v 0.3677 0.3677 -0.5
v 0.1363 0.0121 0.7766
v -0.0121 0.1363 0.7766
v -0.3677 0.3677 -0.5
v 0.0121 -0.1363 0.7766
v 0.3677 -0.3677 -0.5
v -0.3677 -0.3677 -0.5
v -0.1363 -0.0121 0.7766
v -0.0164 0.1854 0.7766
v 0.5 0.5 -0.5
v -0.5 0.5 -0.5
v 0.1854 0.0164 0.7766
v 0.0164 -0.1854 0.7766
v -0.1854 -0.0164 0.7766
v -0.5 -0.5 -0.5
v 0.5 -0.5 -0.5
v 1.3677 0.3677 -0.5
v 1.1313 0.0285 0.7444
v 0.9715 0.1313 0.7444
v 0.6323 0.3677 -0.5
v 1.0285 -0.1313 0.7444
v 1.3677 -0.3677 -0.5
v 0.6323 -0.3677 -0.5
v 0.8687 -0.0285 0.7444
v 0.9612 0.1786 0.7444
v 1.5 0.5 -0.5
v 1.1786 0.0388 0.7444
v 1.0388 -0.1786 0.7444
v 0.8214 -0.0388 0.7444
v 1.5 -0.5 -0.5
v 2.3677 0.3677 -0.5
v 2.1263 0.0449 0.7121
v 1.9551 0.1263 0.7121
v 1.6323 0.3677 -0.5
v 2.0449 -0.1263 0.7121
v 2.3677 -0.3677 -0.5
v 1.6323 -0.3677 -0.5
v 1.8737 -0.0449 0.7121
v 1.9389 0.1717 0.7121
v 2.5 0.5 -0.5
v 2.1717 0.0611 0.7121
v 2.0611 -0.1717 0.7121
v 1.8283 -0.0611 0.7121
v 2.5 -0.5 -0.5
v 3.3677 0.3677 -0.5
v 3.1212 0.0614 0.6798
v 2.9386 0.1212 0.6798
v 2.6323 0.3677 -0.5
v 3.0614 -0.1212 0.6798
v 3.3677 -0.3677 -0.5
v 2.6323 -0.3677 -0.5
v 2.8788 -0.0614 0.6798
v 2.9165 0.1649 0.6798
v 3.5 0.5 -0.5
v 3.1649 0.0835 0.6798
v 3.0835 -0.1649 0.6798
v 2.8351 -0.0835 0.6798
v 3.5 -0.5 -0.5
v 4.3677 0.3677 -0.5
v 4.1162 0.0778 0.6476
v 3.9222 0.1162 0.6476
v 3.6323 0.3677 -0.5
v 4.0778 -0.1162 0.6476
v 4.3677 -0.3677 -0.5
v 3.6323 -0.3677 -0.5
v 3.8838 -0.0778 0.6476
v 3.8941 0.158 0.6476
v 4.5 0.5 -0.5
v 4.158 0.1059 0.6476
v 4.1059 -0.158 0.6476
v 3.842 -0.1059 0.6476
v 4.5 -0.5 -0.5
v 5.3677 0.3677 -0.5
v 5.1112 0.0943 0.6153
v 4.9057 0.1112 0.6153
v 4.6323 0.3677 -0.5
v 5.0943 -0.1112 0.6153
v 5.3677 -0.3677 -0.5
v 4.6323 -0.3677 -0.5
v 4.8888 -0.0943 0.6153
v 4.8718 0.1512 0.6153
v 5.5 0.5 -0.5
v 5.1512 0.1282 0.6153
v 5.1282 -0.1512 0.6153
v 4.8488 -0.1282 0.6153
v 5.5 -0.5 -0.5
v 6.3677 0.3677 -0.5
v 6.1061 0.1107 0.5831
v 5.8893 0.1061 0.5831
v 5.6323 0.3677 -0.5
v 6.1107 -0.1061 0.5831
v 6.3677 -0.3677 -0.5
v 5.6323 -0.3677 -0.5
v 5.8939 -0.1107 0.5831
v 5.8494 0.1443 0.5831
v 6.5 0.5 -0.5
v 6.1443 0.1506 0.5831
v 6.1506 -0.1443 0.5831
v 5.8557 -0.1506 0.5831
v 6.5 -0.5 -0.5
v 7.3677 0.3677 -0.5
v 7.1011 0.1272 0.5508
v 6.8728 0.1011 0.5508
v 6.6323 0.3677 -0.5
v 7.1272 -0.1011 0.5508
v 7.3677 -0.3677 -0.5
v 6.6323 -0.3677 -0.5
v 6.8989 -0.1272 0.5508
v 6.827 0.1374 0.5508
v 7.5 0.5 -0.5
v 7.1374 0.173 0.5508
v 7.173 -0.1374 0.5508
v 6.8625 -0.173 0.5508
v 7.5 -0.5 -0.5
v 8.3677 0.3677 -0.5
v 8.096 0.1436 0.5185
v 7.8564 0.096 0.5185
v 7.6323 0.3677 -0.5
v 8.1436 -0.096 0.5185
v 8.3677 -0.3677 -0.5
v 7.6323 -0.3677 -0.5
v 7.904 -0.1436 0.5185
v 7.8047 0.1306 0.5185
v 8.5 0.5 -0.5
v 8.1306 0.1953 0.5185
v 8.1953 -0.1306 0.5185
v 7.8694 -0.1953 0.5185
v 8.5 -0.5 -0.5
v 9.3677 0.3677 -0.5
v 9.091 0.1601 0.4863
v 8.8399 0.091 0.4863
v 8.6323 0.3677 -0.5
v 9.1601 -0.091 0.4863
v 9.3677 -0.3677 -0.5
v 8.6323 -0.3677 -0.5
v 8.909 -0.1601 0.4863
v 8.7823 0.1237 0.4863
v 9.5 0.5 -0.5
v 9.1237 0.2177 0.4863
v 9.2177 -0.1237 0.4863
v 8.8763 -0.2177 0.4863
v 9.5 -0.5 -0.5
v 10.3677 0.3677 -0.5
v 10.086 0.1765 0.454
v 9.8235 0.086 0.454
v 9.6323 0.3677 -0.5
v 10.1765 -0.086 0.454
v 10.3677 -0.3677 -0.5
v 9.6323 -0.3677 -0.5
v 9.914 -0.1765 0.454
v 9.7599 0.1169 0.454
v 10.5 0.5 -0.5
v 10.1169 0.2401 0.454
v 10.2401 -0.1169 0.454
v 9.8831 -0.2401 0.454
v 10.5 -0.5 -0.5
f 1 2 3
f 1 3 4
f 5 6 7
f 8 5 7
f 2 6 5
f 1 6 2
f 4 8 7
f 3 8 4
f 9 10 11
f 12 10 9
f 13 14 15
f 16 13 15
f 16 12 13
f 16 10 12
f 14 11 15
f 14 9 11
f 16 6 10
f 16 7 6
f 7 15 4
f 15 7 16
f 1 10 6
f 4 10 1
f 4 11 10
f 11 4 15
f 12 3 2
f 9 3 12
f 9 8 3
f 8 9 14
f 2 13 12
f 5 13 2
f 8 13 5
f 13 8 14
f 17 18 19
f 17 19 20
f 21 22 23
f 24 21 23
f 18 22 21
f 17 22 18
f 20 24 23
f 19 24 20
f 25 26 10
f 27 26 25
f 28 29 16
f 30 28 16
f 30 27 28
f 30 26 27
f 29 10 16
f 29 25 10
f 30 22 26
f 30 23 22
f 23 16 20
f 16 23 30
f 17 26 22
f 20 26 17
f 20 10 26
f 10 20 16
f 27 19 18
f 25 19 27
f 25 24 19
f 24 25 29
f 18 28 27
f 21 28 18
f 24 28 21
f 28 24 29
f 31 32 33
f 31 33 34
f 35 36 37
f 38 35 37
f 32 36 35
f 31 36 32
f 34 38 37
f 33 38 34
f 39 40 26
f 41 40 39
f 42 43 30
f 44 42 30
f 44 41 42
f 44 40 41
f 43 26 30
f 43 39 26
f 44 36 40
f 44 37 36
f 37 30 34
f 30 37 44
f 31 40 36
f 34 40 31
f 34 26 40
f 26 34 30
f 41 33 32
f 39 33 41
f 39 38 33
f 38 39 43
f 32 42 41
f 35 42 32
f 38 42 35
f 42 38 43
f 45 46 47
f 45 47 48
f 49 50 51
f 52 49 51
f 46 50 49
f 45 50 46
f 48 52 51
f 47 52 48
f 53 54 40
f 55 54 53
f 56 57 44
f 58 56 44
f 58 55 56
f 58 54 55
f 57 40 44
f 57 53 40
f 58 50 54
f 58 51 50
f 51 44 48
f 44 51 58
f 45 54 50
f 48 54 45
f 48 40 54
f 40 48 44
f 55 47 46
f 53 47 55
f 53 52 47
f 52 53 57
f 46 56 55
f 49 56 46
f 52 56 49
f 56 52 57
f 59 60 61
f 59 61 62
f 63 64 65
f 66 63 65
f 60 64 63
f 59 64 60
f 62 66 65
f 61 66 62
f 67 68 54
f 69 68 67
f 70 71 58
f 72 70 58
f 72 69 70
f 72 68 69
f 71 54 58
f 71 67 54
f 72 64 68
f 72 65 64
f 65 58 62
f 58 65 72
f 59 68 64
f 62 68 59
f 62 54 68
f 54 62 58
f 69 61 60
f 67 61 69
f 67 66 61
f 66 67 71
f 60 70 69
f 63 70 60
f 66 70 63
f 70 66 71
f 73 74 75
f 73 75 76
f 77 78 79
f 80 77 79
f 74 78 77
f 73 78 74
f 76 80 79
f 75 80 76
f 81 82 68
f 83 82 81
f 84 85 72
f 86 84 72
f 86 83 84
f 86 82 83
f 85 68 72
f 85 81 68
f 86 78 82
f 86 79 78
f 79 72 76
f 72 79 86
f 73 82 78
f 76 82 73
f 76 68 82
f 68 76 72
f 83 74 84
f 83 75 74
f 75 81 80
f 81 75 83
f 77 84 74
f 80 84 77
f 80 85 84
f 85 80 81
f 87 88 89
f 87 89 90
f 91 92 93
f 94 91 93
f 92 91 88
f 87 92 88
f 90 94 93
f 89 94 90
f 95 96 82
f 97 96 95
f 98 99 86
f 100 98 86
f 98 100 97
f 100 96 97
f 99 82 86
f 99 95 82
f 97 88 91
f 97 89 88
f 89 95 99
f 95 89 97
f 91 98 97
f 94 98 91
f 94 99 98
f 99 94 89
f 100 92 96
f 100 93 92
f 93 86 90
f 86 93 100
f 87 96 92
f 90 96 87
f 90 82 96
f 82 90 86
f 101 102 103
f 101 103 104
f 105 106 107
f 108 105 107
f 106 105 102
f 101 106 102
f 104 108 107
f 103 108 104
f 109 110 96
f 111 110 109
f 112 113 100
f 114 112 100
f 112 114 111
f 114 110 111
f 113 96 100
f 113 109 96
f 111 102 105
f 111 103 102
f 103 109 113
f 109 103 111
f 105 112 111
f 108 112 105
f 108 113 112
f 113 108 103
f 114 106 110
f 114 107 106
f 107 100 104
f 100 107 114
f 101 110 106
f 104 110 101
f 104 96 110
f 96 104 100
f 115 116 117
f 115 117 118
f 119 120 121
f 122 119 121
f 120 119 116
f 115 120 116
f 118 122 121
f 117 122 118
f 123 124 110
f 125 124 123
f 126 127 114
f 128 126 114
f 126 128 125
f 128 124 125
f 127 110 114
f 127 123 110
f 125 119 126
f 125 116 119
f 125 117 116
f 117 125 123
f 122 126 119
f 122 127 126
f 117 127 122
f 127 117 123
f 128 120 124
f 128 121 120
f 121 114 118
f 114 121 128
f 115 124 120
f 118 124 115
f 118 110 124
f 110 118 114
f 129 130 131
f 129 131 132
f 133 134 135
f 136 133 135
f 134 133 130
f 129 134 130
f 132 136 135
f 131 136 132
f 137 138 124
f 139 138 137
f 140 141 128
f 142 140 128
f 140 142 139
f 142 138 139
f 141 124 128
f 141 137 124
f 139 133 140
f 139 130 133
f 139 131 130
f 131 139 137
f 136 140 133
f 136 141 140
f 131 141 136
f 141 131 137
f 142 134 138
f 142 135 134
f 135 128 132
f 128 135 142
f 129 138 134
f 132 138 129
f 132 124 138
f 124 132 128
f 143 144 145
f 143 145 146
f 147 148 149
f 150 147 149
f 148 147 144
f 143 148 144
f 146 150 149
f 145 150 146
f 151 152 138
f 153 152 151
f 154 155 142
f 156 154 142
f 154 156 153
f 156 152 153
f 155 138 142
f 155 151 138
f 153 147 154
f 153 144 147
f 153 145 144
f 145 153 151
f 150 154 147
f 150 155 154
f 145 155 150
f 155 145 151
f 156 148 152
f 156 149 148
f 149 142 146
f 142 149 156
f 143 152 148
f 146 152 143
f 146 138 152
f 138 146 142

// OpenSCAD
/* [Global] */

pvalue = 20; // [10.0:20.0]
pvalue_text = "blah blah blah";

/* [Hidden] */

points_01 = [[-0.048376, -0.463729, 0.131425], [0.463729, -0.048376, 0.131425], [-0.463729, 0.048376, 0.131425], [0.048376, 0.463729, 0.131425], [-0.5, 0.5, -0.5], [0.5, 0.5, -0.5], [-0.5, -0.5, -0.5], [0.5, -0.5, -0.5], [-0.341008, 0.035574, 0.131425], [0.035574, 0.341008, 0.131425], [0.36768, 0.36768, -0.5], [-0.36768, 0.36768, -0.5], [-0.36768, -0.36768, -0.5], [0.36768, -0.36768, -0.5], [0.341008, -0.035574, 0.131425], [-0.035574, -0.341008, 0.131425]];
triangles_01 = [[8, 9, 11], [11, 9, 10], [12, 13, 15], [15, 13, 14], [13, 10, 14], [14, 10, 9], [15, 8, 12], [12, 8, 11], [2, 4, 3], [3, 4, 5], [6, 0, 7], [7, 0, 1], [3, 5, 1], [1, 5, 7], [4, 2, 6], [6, 2, 0], [2, 3, 8], [8, 3, 9], [5, 4, 10], [10, 4, 11], [6, 7, 12], [12, 7, 13], [1, 0, 14], [14, 0, 15], [7, 5, 13], [13, 5, 10], [3, 1, 9], [9, 1, 14], [0, 2, 15], [15, 2, 8], [4, 6, 11], [11, 6, 12]];

points_02 = [[-0.185412, -0.01639, 0.776613], [0.01639, -0.185412, 0.776613], [-0.01639, 0.185412, 0.776613], [0.185412, 0.01639, 0.776613], [-0.5, 0.5, -0.5], [0.5, 0.5, -0.5], [-0.5, -0.5, -0.5], [0.5, -0.5, -0.5], [-0.012052, 0.136344, 0.776613], [0.136344, 0.012052, 0.776613], [0.36768, 0.36768, -0.5], [-0.36768, 0.36768, -0.5], [-0.36768, -0.36768, -0.5], [0.36768, -0.36768, -0.5], [0.012052, -0.136344, 0.776613], [-0.136344, -0.012052, 0.776613]];
triangles_02 = [[9, 10, 8], [8, 10, 11], [13, 14, 12], [12, 14, 15], [14, 13, 9], [9, 13, 10], [12, 15, 11], [11, 15, 8], [4, 5, 2], [2, 5, 3], [0, 1, 6], [6, 1, 7], [1, 3, 7], [7, 3, 5], [6, 4, 0], [0, 4, 2], [2, 3, 8], [8, 3, 9], [5, 4, 10], [10, 4, 11], [6, 7, 12], [12, 7, 13], [1, 0, 14], [14, 0, 15], [7, 5, 13], [13, 5, 10], [3, 1, 9], [9, 1, 14], [0, 2, 15], [15, 2, 8], [4, 6, 11], [11, 6, 12]];

vectors = points_01 - points_02;

for (i = [0:10]){
translate([i, 0, 0])
polyhedron(points=points_02+vectors*(i/pvalue), triangles=triangles_02);
}
